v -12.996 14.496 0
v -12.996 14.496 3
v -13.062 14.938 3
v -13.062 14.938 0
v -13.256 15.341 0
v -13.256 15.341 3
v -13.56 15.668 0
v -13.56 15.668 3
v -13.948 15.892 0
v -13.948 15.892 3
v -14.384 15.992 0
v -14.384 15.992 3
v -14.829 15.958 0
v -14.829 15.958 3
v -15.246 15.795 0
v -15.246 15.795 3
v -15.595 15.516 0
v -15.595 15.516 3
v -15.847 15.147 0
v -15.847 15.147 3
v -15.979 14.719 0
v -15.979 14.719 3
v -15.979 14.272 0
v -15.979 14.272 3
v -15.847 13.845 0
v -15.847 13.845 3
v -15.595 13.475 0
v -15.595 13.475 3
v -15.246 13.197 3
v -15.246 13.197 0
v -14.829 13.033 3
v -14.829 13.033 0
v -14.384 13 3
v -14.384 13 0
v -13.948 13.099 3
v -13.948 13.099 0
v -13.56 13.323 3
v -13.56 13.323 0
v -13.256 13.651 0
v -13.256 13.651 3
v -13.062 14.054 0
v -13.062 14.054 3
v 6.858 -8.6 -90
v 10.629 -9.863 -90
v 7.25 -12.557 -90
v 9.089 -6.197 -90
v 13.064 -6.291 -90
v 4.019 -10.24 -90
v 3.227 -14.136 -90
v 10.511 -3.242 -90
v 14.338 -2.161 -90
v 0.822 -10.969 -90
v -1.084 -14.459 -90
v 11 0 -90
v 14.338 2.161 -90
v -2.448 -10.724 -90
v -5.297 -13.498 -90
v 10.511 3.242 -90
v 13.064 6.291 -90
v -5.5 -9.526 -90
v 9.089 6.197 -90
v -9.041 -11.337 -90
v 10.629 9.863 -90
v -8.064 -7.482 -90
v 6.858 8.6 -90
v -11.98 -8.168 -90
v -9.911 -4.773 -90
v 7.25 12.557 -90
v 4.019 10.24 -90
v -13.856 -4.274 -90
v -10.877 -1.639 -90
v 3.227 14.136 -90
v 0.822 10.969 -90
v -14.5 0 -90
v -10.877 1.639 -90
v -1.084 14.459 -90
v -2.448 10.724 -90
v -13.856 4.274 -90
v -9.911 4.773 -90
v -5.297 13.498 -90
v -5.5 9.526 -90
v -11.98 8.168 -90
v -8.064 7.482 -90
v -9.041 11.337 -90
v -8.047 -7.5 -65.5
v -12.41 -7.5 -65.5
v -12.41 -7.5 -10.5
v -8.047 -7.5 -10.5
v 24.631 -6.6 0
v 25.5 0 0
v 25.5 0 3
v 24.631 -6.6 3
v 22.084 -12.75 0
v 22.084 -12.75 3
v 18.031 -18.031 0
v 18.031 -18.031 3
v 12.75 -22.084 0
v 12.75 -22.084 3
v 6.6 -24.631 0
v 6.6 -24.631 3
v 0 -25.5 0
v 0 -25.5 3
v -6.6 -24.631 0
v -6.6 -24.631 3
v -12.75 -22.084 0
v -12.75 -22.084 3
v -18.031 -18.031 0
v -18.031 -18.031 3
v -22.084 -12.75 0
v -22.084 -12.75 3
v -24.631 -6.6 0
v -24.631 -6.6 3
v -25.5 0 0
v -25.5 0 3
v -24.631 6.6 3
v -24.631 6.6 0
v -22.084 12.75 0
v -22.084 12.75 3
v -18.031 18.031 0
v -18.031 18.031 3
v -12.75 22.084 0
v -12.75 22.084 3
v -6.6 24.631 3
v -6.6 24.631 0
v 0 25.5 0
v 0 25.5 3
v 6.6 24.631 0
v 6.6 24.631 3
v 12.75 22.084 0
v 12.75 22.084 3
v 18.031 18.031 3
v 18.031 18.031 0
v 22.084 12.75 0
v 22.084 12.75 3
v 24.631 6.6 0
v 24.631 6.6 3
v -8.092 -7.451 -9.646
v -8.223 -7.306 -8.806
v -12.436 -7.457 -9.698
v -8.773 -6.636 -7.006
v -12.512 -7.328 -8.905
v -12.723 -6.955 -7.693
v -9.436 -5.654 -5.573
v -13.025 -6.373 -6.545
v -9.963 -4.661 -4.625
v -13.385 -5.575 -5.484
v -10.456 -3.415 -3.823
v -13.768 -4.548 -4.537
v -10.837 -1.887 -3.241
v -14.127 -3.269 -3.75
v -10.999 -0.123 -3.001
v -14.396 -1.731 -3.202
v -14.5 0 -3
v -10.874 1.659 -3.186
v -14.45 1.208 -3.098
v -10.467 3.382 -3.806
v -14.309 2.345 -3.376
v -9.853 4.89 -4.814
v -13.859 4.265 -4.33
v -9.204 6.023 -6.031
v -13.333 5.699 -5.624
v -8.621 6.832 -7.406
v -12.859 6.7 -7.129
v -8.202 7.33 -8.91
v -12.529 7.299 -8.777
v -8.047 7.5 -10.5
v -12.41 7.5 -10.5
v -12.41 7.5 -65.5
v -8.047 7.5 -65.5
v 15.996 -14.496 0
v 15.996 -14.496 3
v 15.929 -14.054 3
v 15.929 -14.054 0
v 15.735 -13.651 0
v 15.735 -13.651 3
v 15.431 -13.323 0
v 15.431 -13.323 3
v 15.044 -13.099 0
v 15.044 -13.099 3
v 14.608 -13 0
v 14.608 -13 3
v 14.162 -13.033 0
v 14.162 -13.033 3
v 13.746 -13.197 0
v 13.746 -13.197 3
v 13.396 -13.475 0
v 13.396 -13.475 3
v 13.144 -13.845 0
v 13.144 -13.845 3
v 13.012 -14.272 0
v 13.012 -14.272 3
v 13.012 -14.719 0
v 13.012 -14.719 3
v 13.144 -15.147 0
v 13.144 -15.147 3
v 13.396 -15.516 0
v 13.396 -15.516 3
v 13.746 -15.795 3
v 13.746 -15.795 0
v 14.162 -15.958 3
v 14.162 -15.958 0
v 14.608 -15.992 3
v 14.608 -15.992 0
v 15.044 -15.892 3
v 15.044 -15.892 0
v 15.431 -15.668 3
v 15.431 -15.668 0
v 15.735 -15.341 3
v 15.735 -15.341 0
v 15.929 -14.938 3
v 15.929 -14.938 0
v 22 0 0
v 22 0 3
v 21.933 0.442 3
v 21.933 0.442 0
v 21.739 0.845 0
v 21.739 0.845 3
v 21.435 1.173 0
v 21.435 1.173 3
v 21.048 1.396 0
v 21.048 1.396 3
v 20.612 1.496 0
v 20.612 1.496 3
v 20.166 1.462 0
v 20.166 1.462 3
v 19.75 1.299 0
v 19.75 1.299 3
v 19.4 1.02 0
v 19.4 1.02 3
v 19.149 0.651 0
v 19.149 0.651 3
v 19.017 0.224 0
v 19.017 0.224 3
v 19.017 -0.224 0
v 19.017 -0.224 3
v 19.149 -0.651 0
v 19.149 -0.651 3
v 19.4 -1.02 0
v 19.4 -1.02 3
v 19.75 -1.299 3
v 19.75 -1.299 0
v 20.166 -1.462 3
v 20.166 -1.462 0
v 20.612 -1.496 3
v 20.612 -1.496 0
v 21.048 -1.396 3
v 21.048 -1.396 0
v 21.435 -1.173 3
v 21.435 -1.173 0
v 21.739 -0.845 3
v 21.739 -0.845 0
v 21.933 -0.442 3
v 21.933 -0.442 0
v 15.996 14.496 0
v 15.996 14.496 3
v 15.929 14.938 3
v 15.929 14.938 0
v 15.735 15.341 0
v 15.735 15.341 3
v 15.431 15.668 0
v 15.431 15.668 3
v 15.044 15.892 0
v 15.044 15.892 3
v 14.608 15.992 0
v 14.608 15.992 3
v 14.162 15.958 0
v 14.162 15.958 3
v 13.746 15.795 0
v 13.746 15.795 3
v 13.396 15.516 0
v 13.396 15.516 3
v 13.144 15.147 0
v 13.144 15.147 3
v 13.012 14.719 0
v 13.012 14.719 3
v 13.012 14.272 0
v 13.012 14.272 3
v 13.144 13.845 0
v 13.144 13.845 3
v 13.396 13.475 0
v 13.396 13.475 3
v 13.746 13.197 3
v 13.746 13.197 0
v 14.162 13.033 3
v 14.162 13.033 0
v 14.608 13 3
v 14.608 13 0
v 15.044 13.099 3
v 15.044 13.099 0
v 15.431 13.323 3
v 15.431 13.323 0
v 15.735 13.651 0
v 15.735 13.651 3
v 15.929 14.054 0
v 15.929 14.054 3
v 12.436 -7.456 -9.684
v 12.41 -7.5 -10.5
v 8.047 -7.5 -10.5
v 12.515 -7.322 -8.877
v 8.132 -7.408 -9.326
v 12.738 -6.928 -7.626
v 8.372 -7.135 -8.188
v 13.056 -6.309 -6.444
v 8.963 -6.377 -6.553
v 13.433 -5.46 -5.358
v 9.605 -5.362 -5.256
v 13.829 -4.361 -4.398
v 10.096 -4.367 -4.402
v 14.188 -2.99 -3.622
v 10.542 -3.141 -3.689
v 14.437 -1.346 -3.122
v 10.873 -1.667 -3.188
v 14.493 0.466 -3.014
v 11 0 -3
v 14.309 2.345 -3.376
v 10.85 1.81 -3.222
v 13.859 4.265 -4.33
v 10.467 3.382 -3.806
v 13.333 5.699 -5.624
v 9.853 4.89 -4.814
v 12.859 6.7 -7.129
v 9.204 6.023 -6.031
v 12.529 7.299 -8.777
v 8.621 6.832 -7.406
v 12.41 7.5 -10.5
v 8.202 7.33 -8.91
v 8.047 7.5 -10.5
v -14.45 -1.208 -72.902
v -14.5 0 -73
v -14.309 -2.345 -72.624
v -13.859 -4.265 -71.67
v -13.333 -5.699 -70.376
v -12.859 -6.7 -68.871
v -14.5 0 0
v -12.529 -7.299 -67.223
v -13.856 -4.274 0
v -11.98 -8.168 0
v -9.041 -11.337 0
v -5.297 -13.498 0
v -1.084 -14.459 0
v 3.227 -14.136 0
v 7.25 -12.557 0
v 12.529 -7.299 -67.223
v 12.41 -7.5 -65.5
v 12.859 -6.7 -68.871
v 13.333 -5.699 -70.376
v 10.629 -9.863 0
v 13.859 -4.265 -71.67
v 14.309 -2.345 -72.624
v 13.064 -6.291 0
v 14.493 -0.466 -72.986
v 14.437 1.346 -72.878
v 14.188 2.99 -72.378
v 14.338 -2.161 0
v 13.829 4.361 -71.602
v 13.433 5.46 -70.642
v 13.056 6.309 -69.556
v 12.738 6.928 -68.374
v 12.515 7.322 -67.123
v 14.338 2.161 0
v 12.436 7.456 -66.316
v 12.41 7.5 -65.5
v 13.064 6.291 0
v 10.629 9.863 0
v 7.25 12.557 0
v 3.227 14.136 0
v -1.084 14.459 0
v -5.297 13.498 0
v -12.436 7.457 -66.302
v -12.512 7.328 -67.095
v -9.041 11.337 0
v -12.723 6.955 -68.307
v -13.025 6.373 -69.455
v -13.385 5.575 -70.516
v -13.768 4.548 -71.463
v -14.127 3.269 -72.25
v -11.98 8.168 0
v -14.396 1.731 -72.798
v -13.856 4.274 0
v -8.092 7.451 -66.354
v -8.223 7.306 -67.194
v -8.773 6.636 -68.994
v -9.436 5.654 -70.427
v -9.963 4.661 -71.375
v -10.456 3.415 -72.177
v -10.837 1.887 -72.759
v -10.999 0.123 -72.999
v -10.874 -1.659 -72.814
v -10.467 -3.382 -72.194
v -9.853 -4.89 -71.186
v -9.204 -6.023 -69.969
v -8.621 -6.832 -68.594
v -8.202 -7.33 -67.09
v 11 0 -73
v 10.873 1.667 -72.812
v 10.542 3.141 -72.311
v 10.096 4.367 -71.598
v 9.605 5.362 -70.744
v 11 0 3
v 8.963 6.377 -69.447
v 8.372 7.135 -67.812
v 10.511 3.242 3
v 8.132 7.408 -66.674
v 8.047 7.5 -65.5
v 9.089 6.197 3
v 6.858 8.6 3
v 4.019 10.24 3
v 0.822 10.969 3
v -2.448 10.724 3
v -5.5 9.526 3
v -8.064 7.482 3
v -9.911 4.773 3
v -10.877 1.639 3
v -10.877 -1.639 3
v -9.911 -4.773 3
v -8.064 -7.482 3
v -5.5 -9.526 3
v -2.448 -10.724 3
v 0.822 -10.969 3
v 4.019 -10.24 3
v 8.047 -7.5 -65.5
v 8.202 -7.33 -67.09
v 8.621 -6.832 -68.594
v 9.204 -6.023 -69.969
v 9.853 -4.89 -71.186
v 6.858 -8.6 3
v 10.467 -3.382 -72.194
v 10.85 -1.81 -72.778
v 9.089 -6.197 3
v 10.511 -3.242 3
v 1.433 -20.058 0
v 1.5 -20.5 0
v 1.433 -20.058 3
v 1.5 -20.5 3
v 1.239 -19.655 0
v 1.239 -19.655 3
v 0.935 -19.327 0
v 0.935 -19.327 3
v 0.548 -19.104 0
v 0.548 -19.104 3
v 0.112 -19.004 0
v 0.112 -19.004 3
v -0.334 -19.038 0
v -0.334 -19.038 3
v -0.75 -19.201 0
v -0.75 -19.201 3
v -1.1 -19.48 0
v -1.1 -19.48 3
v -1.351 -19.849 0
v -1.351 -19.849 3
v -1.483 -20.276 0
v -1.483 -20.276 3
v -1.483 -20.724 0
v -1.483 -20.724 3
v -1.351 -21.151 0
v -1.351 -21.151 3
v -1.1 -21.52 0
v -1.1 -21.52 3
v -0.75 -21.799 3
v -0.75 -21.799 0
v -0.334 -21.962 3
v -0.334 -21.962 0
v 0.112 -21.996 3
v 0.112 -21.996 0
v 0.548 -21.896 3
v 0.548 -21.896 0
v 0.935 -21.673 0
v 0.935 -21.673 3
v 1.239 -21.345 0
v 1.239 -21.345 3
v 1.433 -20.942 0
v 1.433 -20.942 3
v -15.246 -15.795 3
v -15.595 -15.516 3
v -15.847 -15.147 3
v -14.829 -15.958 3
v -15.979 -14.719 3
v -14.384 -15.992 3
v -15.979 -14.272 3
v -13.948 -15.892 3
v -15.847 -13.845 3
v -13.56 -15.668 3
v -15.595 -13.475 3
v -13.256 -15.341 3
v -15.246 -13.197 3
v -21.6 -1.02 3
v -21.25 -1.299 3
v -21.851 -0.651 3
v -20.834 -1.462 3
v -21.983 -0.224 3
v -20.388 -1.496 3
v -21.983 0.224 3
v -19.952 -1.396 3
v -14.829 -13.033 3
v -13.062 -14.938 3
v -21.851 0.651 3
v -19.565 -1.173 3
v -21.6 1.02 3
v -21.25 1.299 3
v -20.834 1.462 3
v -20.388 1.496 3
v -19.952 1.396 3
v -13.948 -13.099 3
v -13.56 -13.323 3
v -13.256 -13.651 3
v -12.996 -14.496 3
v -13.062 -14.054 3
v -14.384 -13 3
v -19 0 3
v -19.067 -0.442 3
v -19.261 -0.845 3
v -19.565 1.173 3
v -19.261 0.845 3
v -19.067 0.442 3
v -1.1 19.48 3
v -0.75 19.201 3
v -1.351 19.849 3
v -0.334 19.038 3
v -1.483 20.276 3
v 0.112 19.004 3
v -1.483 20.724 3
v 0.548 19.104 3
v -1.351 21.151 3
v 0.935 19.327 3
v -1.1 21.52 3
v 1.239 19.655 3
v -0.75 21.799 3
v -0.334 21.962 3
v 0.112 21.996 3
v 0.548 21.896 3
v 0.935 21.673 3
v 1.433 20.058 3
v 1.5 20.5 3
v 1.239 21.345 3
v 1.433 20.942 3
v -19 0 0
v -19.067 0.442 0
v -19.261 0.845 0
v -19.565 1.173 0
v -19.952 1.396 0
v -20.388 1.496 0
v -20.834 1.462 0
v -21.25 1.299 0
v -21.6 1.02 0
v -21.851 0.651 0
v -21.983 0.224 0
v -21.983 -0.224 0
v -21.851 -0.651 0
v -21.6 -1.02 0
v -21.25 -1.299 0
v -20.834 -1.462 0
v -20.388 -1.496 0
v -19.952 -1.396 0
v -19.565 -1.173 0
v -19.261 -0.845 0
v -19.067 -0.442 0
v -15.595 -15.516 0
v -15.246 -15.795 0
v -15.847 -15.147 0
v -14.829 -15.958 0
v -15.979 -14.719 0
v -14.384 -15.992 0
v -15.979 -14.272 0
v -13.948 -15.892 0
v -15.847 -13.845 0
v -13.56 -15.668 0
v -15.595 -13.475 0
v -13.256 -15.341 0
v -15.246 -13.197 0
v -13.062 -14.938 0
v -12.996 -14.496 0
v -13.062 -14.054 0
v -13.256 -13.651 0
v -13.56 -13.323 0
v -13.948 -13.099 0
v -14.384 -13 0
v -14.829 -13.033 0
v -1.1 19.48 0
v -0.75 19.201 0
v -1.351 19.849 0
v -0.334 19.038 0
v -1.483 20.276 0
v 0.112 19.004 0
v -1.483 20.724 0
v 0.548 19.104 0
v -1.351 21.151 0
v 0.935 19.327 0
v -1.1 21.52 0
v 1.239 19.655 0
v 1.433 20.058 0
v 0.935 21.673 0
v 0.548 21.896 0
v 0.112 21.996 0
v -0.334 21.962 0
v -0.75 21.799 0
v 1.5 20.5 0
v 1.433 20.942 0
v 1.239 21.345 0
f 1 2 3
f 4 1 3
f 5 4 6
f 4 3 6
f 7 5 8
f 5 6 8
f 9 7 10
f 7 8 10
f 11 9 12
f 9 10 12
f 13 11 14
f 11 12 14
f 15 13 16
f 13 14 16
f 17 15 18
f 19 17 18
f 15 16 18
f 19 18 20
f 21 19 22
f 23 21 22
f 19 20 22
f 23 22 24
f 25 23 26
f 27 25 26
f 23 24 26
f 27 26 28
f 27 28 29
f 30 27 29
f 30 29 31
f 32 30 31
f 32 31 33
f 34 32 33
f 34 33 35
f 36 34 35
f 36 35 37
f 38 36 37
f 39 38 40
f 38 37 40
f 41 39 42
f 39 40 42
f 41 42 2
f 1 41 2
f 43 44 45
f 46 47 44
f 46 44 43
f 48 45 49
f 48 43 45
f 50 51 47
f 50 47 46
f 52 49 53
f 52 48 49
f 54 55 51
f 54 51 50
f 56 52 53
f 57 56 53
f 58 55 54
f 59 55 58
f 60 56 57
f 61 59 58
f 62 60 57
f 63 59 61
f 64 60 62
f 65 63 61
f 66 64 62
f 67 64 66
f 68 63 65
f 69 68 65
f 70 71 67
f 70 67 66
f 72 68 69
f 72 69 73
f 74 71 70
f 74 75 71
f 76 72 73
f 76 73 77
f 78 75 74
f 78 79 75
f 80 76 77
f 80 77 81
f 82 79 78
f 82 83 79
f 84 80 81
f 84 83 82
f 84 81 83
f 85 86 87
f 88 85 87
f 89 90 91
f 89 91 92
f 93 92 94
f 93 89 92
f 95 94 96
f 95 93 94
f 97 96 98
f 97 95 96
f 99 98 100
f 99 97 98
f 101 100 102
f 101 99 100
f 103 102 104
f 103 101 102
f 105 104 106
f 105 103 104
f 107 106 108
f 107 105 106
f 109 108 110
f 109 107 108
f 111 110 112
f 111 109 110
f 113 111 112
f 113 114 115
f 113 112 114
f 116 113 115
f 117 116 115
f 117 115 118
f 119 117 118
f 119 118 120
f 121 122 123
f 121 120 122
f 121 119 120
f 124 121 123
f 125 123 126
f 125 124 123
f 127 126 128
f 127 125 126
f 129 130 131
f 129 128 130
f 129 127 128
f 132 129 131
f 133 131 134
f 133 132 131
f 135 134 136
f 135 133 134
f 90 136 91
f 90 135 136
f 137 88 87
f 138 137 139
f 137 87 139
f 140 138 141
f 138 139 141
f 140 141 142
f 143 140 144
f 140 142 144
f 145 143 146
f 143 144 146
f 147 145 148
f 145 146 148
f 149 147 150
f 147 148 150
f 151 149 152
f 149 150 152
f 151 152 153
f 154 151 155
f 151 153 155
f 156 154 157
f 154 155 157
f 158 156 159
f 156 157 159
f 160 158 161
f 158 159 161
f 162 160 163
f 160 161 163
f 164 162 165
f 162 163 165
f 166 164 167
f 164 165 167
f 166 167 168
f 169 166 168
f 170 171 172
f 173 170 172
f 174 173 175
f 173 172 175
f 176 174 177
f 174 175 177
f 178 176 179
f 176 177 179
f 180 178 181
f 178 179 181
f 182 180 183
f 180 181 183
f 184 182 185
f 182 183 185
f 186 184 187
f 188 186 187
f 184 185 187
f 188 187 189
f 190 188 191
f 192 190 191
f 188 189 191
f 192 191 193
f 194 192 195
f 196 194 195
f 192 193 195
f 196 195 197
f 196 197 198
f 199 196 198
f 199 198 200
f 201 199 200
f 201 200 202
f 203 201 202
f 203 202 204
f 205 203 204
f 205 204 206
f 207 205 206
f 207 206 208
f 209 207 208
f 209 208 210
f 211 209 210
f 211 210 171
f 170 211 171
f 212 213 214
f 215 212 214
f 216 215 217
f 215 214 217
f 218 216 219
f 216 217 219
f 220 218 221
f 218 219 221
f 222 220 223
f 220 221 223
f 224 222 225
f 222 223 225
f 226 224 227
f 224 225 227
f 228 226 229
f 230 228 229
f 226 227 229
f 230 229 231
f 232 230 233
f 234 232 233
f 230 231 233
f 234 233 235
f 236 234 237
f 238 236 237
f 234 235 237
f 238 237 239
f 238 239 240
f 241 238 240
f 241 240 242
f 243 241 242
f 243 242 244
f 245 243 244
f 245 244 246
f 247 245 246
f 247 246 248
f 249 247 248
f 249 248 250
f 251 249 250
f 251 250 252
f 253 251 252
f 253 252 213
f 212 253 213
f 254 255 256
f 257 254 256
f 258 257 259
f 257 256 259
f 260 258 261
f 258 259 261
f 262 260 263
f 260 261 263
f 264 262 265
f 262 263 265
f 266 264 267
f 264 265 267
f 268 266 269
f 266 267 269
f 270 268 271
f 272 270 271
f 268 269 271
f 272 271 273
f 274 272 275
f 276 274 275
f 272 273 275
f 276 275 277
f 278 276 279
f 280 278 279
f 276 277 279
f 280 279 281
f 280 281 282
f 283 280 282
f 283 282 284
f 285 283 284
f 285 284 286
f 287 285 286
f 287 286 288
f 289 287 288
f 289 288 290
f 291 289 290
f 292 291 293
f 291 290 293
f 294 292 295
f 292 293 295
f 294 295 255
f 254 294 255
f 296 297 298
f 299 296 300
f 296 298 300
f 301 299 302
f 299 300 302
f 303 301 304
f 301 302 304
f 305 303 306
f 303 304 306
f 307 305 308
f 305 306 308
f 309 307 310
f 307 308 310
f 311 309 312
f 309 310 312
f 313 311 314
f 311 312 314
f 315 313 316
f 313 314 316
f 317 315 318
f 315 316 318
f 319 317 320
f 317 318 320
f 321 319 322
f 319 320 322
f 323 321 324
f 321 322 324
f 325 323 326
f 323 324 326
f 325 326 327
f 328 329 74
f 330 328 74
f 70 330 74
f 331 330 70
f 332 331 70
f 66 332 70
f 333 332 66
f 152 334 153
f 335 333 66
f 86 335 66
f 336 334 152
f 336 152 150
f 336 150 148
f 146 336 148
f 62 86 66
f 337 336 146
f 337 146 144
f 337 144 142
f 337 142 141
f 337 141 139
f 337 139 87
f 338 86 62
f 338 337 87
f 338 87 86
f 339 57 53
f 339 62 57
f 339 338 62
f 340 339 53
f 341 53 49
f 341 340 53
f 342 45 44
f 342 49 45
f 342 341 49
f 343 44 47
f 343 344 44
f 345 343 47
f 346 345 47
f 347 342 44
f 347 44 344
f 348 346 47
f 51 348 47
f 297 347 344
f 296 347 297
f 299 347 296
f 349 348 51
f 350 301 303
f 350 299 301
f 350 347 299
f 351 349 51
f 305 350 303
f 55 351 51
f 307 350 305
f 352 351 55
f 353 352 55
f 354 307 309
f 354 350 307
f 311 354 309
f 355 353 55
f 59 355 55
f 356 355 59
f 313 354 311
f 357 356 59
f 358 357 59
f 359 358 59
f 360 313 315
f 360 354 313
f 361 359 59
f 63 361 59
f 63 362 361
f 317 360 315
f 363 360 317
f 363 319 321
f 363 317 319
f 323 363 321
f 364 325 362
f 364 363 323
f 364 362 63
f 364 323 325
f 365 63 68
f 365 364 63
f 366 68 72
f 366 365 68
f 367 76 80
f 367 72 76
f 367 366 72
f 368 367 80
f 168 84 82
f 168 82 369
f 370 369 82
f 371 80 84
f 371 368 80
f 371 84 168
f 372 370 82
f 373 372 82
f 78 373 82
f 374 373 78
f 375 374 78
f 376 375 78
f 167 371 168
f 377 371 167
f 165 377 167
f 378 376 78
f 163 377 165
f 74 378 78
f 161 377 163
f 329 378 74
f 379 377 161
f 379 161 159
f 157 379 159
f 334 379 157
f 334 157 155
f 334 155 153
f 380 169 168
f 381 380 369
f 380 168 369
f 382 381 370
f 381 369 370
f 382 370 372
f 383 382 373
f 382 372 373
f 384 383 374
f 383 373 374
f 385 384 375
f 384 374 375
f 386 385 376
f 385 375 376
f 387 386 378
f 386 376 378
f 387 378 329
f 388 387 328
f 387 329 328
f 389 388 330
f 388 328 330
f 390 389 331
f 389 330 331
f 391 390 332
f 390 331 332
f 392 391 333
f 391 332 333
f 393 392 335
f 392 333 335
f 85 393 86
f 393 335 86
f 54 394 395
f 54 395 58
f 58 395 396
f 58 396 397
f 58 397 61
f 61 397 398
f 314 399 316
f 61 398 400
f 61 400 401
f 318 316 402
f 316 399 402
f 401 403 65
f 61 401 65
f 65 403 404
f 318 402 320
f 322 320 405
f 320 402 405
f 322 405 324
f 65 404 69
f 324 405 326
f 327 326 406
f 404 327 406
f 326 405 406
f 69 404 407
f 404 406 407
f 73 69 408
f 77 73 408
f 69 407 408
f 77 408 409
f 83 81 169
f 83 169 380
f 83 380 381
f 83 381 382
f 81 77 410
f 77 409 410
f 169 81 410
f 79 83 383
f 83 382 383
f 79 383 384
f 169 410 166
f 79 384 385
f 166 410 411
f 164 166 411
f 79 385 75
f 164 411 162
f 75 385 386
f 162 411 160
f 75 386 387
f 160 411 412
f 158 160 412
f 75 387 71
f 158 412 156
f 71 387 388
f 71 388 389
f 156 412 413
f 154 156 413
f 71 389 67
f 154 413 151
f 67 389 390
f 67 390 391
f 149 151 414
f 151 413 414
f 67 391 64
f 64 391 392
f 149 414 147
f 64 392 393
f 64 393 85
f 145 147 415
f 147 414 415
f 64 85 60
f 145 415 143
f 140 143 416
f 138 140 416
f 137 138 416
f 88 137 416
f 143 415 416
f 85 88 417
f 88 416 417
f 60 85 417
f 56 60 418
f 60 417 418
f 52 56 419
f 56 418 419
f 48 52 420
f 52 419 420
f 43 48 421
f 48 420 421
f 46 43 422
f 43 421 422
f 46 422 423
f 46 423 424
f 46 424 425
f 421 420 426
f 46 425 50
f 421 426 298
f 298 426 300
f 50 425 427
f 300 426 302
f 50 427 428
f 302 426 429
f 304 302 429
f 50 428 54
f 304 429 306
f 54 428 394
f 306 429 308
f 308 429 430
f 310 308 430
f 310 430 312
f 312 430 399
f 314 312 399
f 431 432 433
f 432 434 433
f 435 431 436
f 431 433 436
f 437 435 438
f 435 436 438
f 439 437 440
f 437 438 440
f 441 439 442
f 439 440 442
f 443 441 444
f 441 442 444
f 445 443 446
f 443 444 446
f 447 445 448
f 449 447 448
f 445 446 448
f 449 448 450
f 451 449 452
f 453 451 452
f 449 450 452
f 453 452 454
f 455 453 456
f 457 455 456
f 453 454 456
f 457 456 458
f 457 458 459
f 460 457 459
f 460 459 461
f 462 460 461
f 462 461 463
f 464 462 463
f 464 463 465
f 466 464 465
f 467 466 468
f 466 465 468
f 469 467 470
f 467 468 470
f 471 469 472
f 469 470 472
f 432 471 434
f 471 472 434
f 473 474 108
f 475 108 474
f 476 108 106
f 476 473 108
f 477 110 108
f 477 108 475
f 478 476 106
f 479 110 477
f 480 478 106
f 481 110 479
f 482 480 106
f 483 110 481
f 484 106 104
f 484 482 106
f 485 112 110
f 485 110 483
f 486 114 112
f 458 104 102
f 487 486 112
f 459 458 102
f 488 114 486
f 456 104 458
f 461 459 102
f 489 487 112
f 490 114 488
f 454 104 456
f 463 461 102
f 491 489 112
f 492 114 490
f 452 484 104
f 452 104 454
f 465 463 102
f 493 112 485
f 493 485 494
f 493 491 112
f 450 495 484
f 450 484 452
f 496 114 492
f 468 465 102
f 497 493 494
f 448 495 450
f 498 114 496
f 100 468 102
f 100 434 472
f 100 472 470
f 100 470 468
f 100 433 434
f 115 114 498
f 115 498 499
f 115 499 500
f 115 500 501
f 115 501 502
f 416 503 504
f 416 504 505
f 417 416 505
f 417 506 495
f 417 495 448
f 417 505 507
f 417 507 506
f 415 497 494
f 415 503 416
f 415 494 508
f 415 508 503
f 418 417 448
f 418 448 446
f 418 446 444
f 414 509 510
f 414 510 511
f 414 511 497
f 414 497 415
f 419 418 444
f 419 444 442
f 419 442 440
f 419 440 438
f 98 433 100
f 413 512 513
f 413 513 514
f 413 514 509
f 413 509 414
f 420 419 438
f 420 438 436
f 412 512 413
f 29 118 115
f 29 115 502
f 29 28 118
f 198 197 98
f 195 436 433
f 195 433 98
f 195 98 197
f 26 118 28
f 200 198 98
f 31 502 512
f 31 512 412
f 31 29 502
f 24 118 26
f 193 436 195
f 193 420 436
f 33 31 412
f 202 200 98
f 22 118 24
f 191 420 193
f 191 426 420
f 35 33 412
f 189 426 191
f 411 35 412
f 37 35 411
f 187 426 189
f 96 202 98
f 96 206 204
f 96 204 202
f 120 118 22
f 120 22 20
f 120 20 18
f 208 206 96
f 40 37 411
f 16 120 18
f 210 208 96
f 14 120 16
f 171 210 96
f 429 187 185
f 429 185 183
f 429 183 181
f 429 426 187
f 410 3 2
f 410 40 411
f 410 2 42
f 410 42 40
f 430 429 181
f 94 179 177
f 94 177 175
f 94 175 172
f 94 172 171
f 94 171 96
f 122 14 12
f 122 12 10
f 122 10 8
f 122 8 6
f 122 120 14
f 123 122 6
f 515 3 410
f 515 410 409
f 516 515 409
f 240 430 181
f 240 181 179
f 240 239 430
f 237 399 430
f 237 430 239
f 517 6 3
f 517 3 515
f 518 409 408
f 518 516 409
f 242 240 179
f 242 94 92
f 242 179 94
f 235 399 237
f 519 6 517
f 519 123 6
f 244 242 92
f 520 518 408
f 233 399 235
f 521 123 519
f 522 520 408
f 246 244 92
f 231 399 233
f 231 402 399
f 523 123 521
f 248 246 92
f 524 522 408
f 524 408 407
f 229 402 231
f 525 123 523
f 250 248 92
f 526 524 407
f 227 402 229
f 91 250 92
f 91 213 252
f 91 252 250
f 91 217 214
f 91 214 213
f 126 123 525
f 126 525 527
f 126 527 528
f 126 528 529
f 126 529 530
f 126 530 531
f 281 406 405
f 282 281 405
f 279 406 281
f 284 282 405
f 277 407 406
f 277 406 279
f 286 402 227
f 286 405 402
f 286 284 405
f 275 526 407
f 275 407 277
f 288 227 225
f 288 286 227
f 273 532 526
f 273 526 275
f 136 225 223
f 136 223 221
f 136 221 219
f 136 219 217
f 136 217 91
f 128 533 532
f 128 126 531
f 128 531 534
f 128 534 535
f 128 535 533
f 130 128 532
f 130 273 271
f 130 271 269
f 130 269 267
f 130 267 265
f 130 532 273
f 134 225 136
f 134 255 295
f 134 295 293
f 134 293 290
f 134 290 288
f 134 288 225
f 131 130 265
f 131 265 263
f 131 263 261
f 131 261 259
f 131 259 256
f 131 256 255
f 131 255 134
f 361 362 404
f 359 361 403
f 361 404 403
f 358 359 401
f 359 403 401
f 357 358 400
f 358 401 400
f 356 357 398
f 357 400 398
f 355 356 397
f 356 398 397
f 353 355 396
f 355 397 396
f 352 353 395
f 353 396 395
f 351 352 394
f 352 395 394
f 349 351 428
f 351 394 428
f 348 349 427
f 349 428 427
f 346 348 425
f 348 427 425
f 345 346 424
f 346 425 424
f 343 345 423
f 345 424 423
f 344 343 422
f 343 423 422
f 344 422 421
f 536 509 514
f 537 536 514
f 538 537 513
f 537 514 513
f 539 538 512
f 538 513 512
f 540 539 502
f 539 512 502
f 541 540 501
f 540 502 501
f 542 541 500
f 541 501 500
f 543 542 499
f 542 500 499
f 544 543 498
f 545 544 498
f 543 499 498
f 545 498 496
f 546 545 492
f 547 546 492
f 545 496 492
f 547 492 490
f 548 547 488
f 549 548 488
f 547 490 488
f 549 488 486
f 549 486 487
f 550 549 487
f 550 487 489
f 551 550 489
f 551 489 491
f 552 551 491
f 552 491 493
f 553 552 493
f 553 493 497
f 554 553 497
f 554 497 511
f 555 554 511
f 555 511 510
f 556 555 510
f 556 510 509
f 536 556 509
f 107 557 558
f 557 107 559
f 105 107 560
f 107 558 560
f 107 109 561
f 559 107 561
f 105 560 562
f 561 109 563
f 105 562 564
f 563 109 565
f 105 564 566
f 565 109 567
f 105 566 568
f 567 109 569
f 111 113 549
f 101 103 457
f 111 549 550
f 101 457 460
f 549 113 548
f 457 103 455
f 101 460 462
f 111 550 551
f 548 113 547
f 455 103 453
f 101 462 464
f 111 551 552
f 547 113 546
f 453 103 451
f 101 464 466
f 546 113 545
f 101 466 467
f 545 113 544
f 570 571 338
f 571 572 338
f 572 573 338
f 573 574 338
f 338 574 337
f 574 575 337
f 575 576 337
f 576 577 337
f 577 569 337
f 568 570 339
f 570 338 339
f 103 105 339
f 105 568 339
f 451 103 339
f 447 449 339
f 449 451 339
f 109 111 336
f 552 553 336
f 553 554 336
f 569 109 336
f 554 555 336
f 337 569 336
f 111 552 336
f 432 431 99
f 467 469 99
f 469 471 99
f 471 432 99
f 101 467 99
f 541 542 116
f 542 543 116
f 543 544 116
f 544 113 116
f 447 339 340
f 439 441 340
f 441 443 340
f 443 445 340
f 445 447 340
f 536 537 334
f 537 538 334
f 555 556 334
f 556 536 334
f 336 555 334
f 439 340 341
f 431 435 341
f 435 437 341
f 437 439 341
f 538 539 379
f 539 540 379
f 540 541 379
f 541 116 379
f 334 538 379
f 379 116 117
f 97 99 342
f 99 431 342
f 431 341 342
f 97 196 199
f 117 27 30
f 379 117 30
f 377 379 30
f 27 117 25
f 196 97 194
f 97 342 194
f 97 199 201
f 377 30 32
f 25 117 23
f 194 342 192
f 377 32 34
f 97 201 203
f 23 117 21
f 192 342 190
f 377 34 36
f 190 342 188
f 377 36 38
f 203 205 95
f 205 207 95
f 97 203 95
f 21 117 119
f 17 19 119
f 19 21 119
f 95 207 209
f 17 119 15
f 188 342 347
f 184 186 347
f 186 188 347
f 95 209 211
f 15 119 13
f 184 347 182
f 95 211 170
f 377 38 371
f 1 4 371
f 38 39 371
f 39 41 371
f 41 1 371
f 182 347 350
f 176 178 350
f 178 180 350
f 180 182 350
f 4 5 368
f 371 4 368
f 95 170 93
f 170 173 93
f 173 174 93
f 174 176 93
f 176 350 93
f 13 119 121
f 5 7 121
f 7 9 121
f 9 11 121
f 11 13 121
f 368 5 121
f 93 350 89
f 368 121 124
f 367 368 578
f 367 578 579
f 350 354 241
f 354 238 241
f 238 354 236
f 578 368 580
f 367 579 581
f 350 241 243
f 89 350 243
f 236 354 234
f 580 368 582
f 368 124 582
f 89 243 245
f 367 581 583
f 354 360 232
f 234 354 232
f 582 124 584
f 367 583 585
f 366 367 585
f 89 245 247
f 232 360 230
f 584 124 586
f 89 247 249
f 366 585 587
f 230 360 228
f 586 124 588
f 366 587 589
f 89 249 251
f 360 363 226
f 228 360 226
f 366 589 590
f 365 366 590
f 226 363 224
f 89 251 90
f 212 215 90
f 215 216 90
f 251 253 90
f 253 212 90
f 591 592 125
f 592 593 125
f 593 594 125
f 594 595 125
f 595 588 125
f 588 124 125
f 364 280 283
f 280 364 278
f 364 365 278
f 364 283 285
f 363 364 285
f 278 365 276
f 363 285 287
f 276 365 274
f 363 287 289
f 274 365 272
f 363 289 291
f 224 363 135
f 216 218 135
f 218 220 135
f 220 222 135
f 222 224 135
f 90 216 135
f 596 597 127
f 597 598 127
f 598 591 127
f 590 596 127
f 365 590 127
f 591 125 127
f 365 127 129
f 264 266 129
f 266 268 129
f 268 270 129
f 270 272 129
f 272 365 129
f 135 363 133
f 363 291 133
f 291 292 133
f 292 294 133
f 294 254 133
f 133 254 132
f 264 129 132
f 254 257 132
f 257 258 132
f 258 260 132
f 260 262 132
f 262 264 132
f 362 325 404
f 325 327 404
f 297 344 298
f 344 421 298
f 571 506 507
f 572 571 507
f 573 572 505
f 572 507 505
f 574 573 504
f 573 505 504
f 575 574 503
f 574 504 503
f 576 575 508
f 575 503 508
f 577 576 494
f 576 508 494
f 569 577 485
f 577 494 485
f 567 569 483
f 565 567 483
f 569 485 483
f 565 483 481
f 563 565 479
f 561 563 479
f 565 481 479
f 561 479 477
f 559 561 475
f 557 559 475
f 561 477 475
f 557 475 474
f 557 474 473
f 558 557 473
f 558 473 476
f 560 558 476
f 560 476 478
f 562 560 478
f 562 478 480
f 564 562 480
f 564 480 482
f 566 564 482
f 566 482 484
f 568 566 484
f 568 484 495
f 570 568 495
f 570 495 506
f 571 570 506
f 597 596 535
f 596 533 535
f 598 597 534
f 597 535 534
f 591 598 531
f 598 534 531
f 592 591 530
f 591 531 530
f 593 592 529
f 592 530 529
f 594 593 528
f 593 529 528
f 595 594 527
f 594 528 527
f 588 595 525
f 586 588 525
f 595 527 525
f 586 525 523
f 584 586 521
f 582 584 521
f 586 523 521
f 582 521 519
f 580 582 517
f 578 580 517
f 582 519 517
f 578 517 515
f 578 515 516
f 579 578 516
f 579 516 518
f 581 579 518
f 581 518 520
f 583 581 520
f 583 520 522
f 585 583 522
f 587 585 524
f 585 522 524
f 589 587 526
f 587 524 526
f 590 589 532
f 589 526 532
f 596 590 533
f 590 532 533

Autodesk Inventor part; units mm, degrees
ref_plane "YZ Plane" through (0, 0, 0) normal (1, 0, 0) x (0, 1, 0)
ref_plane "XZ Plane" through (0, 0, 0) normal (0, 1, 0) x (-1, 0, 0)
ref_plane "XY Plane" through (0, 0, 0) normal (0, 0, 1) x (1, 0, 0)
sketch "Sketch1" plane through (0, 0, 0) normal (0, 0, 1) x (1, 0, 0)
  circle A0 centre (0, 0) radius 25.5
  dimension "d0" = 51
extrude "Extrusion1" add sketch "Sketch1" along normal blind 3
sketch "Sketch2" plane through (0, 0, 0) normal (0, 0, -1) x (-1, 0, 0)
  circle A0 centre (0, 0) radius 25.5 projected
  circle A1 centre (0, 0) radius 14.5
  dimension "d3" = 29
extrude "Extrusion2" add sketch "Sketch2" along normal blind 90 contours A1
sketch "Sketch3" plane through (0, 0, 3) normal (0, 0, 1) x (1, 0, 0)
  circle A0 centre (0, 0) radius 25.5 projected
  circle A1 centre (0, 0) radius 20.5
  circle A2 centre (0, 20.5) radius 1.5
  circle A3 centre (-14.4957, 14.4957) radius 1.5
  circle A4 centre (-20.5, 0) radius 1.5
  circle A5 centre (-14.4957, -14.4957) radius 1.5
  circle A6 centre (0, -20.5) radius 1.5
  circle A7 centre (14.4957, -14.4957) radius 1.5
  circle A8 centre (20.5, 0) radius 1.5
  circle A9 centre (14.4957, 14.4957) radius 1.5
  dimension "d6" = 41
  dimension "d7" = 3
  dimension "d10" = 360
extrude "Extrusion3" cut sketch "Sketch3" against normal through all contours A1 A8 | A1 A8 | A9 A1 | A1 A9 | A7 A1 | A1 A7 | A2 A1 | A1 A2 | A6 A1 | A1 A6 | A3 A1 | A1 A3 | A5 A1 | A1 A5 | A4 A1 | A1 A4
sketch "Sketch4" plane through (0, 0, 3) normal (0, 0, 1) x (1, 0, 0)
  circle A0 centre (0, 0) radius 25.5 projected
  circle A1 centre (0, 0) radius 11
  dimension "d14" = 22
extrude "Extrusion4" cut sketch "Sketch4" against normal through all contours A1
sketch "Sketch5" plane through (0, 0, 0) normal (1, 0, 0) x (0, 1, 0)
  line L0 (0, -10.5) -> (0, -65.5)
  arc A0 (-7.5, -65.5) -> (7.5, -65.5) centre (0, -65.5) ccw
  arc A1 (7.5, -10.5) -> (-7.5, -10.5) centre (0, -10.5) ccw
  line L1 (7.5, -10.5) -> (7.5, -65.5)
  line L2 (-7.5, -65.5) -> (-7.5, -10.5)
  line L3 (25.5, 3) -> (-25.5, 3) projected
  point P0 (0, 0)
  point P1 (0, -3)
  point P2 (0, 3)
  dimension "d17" = 7.5
  dimension "d18" = 7.5
  dimension "d22" = 55
  dimension "d23" = 13.5
extrude "Extrusion5" cut sketch "Sketch5" along normal through all both and the other way through all
properties part number "11 CROSSHEAD GUIDE" material "Steel AISI 1020 107 HR"
